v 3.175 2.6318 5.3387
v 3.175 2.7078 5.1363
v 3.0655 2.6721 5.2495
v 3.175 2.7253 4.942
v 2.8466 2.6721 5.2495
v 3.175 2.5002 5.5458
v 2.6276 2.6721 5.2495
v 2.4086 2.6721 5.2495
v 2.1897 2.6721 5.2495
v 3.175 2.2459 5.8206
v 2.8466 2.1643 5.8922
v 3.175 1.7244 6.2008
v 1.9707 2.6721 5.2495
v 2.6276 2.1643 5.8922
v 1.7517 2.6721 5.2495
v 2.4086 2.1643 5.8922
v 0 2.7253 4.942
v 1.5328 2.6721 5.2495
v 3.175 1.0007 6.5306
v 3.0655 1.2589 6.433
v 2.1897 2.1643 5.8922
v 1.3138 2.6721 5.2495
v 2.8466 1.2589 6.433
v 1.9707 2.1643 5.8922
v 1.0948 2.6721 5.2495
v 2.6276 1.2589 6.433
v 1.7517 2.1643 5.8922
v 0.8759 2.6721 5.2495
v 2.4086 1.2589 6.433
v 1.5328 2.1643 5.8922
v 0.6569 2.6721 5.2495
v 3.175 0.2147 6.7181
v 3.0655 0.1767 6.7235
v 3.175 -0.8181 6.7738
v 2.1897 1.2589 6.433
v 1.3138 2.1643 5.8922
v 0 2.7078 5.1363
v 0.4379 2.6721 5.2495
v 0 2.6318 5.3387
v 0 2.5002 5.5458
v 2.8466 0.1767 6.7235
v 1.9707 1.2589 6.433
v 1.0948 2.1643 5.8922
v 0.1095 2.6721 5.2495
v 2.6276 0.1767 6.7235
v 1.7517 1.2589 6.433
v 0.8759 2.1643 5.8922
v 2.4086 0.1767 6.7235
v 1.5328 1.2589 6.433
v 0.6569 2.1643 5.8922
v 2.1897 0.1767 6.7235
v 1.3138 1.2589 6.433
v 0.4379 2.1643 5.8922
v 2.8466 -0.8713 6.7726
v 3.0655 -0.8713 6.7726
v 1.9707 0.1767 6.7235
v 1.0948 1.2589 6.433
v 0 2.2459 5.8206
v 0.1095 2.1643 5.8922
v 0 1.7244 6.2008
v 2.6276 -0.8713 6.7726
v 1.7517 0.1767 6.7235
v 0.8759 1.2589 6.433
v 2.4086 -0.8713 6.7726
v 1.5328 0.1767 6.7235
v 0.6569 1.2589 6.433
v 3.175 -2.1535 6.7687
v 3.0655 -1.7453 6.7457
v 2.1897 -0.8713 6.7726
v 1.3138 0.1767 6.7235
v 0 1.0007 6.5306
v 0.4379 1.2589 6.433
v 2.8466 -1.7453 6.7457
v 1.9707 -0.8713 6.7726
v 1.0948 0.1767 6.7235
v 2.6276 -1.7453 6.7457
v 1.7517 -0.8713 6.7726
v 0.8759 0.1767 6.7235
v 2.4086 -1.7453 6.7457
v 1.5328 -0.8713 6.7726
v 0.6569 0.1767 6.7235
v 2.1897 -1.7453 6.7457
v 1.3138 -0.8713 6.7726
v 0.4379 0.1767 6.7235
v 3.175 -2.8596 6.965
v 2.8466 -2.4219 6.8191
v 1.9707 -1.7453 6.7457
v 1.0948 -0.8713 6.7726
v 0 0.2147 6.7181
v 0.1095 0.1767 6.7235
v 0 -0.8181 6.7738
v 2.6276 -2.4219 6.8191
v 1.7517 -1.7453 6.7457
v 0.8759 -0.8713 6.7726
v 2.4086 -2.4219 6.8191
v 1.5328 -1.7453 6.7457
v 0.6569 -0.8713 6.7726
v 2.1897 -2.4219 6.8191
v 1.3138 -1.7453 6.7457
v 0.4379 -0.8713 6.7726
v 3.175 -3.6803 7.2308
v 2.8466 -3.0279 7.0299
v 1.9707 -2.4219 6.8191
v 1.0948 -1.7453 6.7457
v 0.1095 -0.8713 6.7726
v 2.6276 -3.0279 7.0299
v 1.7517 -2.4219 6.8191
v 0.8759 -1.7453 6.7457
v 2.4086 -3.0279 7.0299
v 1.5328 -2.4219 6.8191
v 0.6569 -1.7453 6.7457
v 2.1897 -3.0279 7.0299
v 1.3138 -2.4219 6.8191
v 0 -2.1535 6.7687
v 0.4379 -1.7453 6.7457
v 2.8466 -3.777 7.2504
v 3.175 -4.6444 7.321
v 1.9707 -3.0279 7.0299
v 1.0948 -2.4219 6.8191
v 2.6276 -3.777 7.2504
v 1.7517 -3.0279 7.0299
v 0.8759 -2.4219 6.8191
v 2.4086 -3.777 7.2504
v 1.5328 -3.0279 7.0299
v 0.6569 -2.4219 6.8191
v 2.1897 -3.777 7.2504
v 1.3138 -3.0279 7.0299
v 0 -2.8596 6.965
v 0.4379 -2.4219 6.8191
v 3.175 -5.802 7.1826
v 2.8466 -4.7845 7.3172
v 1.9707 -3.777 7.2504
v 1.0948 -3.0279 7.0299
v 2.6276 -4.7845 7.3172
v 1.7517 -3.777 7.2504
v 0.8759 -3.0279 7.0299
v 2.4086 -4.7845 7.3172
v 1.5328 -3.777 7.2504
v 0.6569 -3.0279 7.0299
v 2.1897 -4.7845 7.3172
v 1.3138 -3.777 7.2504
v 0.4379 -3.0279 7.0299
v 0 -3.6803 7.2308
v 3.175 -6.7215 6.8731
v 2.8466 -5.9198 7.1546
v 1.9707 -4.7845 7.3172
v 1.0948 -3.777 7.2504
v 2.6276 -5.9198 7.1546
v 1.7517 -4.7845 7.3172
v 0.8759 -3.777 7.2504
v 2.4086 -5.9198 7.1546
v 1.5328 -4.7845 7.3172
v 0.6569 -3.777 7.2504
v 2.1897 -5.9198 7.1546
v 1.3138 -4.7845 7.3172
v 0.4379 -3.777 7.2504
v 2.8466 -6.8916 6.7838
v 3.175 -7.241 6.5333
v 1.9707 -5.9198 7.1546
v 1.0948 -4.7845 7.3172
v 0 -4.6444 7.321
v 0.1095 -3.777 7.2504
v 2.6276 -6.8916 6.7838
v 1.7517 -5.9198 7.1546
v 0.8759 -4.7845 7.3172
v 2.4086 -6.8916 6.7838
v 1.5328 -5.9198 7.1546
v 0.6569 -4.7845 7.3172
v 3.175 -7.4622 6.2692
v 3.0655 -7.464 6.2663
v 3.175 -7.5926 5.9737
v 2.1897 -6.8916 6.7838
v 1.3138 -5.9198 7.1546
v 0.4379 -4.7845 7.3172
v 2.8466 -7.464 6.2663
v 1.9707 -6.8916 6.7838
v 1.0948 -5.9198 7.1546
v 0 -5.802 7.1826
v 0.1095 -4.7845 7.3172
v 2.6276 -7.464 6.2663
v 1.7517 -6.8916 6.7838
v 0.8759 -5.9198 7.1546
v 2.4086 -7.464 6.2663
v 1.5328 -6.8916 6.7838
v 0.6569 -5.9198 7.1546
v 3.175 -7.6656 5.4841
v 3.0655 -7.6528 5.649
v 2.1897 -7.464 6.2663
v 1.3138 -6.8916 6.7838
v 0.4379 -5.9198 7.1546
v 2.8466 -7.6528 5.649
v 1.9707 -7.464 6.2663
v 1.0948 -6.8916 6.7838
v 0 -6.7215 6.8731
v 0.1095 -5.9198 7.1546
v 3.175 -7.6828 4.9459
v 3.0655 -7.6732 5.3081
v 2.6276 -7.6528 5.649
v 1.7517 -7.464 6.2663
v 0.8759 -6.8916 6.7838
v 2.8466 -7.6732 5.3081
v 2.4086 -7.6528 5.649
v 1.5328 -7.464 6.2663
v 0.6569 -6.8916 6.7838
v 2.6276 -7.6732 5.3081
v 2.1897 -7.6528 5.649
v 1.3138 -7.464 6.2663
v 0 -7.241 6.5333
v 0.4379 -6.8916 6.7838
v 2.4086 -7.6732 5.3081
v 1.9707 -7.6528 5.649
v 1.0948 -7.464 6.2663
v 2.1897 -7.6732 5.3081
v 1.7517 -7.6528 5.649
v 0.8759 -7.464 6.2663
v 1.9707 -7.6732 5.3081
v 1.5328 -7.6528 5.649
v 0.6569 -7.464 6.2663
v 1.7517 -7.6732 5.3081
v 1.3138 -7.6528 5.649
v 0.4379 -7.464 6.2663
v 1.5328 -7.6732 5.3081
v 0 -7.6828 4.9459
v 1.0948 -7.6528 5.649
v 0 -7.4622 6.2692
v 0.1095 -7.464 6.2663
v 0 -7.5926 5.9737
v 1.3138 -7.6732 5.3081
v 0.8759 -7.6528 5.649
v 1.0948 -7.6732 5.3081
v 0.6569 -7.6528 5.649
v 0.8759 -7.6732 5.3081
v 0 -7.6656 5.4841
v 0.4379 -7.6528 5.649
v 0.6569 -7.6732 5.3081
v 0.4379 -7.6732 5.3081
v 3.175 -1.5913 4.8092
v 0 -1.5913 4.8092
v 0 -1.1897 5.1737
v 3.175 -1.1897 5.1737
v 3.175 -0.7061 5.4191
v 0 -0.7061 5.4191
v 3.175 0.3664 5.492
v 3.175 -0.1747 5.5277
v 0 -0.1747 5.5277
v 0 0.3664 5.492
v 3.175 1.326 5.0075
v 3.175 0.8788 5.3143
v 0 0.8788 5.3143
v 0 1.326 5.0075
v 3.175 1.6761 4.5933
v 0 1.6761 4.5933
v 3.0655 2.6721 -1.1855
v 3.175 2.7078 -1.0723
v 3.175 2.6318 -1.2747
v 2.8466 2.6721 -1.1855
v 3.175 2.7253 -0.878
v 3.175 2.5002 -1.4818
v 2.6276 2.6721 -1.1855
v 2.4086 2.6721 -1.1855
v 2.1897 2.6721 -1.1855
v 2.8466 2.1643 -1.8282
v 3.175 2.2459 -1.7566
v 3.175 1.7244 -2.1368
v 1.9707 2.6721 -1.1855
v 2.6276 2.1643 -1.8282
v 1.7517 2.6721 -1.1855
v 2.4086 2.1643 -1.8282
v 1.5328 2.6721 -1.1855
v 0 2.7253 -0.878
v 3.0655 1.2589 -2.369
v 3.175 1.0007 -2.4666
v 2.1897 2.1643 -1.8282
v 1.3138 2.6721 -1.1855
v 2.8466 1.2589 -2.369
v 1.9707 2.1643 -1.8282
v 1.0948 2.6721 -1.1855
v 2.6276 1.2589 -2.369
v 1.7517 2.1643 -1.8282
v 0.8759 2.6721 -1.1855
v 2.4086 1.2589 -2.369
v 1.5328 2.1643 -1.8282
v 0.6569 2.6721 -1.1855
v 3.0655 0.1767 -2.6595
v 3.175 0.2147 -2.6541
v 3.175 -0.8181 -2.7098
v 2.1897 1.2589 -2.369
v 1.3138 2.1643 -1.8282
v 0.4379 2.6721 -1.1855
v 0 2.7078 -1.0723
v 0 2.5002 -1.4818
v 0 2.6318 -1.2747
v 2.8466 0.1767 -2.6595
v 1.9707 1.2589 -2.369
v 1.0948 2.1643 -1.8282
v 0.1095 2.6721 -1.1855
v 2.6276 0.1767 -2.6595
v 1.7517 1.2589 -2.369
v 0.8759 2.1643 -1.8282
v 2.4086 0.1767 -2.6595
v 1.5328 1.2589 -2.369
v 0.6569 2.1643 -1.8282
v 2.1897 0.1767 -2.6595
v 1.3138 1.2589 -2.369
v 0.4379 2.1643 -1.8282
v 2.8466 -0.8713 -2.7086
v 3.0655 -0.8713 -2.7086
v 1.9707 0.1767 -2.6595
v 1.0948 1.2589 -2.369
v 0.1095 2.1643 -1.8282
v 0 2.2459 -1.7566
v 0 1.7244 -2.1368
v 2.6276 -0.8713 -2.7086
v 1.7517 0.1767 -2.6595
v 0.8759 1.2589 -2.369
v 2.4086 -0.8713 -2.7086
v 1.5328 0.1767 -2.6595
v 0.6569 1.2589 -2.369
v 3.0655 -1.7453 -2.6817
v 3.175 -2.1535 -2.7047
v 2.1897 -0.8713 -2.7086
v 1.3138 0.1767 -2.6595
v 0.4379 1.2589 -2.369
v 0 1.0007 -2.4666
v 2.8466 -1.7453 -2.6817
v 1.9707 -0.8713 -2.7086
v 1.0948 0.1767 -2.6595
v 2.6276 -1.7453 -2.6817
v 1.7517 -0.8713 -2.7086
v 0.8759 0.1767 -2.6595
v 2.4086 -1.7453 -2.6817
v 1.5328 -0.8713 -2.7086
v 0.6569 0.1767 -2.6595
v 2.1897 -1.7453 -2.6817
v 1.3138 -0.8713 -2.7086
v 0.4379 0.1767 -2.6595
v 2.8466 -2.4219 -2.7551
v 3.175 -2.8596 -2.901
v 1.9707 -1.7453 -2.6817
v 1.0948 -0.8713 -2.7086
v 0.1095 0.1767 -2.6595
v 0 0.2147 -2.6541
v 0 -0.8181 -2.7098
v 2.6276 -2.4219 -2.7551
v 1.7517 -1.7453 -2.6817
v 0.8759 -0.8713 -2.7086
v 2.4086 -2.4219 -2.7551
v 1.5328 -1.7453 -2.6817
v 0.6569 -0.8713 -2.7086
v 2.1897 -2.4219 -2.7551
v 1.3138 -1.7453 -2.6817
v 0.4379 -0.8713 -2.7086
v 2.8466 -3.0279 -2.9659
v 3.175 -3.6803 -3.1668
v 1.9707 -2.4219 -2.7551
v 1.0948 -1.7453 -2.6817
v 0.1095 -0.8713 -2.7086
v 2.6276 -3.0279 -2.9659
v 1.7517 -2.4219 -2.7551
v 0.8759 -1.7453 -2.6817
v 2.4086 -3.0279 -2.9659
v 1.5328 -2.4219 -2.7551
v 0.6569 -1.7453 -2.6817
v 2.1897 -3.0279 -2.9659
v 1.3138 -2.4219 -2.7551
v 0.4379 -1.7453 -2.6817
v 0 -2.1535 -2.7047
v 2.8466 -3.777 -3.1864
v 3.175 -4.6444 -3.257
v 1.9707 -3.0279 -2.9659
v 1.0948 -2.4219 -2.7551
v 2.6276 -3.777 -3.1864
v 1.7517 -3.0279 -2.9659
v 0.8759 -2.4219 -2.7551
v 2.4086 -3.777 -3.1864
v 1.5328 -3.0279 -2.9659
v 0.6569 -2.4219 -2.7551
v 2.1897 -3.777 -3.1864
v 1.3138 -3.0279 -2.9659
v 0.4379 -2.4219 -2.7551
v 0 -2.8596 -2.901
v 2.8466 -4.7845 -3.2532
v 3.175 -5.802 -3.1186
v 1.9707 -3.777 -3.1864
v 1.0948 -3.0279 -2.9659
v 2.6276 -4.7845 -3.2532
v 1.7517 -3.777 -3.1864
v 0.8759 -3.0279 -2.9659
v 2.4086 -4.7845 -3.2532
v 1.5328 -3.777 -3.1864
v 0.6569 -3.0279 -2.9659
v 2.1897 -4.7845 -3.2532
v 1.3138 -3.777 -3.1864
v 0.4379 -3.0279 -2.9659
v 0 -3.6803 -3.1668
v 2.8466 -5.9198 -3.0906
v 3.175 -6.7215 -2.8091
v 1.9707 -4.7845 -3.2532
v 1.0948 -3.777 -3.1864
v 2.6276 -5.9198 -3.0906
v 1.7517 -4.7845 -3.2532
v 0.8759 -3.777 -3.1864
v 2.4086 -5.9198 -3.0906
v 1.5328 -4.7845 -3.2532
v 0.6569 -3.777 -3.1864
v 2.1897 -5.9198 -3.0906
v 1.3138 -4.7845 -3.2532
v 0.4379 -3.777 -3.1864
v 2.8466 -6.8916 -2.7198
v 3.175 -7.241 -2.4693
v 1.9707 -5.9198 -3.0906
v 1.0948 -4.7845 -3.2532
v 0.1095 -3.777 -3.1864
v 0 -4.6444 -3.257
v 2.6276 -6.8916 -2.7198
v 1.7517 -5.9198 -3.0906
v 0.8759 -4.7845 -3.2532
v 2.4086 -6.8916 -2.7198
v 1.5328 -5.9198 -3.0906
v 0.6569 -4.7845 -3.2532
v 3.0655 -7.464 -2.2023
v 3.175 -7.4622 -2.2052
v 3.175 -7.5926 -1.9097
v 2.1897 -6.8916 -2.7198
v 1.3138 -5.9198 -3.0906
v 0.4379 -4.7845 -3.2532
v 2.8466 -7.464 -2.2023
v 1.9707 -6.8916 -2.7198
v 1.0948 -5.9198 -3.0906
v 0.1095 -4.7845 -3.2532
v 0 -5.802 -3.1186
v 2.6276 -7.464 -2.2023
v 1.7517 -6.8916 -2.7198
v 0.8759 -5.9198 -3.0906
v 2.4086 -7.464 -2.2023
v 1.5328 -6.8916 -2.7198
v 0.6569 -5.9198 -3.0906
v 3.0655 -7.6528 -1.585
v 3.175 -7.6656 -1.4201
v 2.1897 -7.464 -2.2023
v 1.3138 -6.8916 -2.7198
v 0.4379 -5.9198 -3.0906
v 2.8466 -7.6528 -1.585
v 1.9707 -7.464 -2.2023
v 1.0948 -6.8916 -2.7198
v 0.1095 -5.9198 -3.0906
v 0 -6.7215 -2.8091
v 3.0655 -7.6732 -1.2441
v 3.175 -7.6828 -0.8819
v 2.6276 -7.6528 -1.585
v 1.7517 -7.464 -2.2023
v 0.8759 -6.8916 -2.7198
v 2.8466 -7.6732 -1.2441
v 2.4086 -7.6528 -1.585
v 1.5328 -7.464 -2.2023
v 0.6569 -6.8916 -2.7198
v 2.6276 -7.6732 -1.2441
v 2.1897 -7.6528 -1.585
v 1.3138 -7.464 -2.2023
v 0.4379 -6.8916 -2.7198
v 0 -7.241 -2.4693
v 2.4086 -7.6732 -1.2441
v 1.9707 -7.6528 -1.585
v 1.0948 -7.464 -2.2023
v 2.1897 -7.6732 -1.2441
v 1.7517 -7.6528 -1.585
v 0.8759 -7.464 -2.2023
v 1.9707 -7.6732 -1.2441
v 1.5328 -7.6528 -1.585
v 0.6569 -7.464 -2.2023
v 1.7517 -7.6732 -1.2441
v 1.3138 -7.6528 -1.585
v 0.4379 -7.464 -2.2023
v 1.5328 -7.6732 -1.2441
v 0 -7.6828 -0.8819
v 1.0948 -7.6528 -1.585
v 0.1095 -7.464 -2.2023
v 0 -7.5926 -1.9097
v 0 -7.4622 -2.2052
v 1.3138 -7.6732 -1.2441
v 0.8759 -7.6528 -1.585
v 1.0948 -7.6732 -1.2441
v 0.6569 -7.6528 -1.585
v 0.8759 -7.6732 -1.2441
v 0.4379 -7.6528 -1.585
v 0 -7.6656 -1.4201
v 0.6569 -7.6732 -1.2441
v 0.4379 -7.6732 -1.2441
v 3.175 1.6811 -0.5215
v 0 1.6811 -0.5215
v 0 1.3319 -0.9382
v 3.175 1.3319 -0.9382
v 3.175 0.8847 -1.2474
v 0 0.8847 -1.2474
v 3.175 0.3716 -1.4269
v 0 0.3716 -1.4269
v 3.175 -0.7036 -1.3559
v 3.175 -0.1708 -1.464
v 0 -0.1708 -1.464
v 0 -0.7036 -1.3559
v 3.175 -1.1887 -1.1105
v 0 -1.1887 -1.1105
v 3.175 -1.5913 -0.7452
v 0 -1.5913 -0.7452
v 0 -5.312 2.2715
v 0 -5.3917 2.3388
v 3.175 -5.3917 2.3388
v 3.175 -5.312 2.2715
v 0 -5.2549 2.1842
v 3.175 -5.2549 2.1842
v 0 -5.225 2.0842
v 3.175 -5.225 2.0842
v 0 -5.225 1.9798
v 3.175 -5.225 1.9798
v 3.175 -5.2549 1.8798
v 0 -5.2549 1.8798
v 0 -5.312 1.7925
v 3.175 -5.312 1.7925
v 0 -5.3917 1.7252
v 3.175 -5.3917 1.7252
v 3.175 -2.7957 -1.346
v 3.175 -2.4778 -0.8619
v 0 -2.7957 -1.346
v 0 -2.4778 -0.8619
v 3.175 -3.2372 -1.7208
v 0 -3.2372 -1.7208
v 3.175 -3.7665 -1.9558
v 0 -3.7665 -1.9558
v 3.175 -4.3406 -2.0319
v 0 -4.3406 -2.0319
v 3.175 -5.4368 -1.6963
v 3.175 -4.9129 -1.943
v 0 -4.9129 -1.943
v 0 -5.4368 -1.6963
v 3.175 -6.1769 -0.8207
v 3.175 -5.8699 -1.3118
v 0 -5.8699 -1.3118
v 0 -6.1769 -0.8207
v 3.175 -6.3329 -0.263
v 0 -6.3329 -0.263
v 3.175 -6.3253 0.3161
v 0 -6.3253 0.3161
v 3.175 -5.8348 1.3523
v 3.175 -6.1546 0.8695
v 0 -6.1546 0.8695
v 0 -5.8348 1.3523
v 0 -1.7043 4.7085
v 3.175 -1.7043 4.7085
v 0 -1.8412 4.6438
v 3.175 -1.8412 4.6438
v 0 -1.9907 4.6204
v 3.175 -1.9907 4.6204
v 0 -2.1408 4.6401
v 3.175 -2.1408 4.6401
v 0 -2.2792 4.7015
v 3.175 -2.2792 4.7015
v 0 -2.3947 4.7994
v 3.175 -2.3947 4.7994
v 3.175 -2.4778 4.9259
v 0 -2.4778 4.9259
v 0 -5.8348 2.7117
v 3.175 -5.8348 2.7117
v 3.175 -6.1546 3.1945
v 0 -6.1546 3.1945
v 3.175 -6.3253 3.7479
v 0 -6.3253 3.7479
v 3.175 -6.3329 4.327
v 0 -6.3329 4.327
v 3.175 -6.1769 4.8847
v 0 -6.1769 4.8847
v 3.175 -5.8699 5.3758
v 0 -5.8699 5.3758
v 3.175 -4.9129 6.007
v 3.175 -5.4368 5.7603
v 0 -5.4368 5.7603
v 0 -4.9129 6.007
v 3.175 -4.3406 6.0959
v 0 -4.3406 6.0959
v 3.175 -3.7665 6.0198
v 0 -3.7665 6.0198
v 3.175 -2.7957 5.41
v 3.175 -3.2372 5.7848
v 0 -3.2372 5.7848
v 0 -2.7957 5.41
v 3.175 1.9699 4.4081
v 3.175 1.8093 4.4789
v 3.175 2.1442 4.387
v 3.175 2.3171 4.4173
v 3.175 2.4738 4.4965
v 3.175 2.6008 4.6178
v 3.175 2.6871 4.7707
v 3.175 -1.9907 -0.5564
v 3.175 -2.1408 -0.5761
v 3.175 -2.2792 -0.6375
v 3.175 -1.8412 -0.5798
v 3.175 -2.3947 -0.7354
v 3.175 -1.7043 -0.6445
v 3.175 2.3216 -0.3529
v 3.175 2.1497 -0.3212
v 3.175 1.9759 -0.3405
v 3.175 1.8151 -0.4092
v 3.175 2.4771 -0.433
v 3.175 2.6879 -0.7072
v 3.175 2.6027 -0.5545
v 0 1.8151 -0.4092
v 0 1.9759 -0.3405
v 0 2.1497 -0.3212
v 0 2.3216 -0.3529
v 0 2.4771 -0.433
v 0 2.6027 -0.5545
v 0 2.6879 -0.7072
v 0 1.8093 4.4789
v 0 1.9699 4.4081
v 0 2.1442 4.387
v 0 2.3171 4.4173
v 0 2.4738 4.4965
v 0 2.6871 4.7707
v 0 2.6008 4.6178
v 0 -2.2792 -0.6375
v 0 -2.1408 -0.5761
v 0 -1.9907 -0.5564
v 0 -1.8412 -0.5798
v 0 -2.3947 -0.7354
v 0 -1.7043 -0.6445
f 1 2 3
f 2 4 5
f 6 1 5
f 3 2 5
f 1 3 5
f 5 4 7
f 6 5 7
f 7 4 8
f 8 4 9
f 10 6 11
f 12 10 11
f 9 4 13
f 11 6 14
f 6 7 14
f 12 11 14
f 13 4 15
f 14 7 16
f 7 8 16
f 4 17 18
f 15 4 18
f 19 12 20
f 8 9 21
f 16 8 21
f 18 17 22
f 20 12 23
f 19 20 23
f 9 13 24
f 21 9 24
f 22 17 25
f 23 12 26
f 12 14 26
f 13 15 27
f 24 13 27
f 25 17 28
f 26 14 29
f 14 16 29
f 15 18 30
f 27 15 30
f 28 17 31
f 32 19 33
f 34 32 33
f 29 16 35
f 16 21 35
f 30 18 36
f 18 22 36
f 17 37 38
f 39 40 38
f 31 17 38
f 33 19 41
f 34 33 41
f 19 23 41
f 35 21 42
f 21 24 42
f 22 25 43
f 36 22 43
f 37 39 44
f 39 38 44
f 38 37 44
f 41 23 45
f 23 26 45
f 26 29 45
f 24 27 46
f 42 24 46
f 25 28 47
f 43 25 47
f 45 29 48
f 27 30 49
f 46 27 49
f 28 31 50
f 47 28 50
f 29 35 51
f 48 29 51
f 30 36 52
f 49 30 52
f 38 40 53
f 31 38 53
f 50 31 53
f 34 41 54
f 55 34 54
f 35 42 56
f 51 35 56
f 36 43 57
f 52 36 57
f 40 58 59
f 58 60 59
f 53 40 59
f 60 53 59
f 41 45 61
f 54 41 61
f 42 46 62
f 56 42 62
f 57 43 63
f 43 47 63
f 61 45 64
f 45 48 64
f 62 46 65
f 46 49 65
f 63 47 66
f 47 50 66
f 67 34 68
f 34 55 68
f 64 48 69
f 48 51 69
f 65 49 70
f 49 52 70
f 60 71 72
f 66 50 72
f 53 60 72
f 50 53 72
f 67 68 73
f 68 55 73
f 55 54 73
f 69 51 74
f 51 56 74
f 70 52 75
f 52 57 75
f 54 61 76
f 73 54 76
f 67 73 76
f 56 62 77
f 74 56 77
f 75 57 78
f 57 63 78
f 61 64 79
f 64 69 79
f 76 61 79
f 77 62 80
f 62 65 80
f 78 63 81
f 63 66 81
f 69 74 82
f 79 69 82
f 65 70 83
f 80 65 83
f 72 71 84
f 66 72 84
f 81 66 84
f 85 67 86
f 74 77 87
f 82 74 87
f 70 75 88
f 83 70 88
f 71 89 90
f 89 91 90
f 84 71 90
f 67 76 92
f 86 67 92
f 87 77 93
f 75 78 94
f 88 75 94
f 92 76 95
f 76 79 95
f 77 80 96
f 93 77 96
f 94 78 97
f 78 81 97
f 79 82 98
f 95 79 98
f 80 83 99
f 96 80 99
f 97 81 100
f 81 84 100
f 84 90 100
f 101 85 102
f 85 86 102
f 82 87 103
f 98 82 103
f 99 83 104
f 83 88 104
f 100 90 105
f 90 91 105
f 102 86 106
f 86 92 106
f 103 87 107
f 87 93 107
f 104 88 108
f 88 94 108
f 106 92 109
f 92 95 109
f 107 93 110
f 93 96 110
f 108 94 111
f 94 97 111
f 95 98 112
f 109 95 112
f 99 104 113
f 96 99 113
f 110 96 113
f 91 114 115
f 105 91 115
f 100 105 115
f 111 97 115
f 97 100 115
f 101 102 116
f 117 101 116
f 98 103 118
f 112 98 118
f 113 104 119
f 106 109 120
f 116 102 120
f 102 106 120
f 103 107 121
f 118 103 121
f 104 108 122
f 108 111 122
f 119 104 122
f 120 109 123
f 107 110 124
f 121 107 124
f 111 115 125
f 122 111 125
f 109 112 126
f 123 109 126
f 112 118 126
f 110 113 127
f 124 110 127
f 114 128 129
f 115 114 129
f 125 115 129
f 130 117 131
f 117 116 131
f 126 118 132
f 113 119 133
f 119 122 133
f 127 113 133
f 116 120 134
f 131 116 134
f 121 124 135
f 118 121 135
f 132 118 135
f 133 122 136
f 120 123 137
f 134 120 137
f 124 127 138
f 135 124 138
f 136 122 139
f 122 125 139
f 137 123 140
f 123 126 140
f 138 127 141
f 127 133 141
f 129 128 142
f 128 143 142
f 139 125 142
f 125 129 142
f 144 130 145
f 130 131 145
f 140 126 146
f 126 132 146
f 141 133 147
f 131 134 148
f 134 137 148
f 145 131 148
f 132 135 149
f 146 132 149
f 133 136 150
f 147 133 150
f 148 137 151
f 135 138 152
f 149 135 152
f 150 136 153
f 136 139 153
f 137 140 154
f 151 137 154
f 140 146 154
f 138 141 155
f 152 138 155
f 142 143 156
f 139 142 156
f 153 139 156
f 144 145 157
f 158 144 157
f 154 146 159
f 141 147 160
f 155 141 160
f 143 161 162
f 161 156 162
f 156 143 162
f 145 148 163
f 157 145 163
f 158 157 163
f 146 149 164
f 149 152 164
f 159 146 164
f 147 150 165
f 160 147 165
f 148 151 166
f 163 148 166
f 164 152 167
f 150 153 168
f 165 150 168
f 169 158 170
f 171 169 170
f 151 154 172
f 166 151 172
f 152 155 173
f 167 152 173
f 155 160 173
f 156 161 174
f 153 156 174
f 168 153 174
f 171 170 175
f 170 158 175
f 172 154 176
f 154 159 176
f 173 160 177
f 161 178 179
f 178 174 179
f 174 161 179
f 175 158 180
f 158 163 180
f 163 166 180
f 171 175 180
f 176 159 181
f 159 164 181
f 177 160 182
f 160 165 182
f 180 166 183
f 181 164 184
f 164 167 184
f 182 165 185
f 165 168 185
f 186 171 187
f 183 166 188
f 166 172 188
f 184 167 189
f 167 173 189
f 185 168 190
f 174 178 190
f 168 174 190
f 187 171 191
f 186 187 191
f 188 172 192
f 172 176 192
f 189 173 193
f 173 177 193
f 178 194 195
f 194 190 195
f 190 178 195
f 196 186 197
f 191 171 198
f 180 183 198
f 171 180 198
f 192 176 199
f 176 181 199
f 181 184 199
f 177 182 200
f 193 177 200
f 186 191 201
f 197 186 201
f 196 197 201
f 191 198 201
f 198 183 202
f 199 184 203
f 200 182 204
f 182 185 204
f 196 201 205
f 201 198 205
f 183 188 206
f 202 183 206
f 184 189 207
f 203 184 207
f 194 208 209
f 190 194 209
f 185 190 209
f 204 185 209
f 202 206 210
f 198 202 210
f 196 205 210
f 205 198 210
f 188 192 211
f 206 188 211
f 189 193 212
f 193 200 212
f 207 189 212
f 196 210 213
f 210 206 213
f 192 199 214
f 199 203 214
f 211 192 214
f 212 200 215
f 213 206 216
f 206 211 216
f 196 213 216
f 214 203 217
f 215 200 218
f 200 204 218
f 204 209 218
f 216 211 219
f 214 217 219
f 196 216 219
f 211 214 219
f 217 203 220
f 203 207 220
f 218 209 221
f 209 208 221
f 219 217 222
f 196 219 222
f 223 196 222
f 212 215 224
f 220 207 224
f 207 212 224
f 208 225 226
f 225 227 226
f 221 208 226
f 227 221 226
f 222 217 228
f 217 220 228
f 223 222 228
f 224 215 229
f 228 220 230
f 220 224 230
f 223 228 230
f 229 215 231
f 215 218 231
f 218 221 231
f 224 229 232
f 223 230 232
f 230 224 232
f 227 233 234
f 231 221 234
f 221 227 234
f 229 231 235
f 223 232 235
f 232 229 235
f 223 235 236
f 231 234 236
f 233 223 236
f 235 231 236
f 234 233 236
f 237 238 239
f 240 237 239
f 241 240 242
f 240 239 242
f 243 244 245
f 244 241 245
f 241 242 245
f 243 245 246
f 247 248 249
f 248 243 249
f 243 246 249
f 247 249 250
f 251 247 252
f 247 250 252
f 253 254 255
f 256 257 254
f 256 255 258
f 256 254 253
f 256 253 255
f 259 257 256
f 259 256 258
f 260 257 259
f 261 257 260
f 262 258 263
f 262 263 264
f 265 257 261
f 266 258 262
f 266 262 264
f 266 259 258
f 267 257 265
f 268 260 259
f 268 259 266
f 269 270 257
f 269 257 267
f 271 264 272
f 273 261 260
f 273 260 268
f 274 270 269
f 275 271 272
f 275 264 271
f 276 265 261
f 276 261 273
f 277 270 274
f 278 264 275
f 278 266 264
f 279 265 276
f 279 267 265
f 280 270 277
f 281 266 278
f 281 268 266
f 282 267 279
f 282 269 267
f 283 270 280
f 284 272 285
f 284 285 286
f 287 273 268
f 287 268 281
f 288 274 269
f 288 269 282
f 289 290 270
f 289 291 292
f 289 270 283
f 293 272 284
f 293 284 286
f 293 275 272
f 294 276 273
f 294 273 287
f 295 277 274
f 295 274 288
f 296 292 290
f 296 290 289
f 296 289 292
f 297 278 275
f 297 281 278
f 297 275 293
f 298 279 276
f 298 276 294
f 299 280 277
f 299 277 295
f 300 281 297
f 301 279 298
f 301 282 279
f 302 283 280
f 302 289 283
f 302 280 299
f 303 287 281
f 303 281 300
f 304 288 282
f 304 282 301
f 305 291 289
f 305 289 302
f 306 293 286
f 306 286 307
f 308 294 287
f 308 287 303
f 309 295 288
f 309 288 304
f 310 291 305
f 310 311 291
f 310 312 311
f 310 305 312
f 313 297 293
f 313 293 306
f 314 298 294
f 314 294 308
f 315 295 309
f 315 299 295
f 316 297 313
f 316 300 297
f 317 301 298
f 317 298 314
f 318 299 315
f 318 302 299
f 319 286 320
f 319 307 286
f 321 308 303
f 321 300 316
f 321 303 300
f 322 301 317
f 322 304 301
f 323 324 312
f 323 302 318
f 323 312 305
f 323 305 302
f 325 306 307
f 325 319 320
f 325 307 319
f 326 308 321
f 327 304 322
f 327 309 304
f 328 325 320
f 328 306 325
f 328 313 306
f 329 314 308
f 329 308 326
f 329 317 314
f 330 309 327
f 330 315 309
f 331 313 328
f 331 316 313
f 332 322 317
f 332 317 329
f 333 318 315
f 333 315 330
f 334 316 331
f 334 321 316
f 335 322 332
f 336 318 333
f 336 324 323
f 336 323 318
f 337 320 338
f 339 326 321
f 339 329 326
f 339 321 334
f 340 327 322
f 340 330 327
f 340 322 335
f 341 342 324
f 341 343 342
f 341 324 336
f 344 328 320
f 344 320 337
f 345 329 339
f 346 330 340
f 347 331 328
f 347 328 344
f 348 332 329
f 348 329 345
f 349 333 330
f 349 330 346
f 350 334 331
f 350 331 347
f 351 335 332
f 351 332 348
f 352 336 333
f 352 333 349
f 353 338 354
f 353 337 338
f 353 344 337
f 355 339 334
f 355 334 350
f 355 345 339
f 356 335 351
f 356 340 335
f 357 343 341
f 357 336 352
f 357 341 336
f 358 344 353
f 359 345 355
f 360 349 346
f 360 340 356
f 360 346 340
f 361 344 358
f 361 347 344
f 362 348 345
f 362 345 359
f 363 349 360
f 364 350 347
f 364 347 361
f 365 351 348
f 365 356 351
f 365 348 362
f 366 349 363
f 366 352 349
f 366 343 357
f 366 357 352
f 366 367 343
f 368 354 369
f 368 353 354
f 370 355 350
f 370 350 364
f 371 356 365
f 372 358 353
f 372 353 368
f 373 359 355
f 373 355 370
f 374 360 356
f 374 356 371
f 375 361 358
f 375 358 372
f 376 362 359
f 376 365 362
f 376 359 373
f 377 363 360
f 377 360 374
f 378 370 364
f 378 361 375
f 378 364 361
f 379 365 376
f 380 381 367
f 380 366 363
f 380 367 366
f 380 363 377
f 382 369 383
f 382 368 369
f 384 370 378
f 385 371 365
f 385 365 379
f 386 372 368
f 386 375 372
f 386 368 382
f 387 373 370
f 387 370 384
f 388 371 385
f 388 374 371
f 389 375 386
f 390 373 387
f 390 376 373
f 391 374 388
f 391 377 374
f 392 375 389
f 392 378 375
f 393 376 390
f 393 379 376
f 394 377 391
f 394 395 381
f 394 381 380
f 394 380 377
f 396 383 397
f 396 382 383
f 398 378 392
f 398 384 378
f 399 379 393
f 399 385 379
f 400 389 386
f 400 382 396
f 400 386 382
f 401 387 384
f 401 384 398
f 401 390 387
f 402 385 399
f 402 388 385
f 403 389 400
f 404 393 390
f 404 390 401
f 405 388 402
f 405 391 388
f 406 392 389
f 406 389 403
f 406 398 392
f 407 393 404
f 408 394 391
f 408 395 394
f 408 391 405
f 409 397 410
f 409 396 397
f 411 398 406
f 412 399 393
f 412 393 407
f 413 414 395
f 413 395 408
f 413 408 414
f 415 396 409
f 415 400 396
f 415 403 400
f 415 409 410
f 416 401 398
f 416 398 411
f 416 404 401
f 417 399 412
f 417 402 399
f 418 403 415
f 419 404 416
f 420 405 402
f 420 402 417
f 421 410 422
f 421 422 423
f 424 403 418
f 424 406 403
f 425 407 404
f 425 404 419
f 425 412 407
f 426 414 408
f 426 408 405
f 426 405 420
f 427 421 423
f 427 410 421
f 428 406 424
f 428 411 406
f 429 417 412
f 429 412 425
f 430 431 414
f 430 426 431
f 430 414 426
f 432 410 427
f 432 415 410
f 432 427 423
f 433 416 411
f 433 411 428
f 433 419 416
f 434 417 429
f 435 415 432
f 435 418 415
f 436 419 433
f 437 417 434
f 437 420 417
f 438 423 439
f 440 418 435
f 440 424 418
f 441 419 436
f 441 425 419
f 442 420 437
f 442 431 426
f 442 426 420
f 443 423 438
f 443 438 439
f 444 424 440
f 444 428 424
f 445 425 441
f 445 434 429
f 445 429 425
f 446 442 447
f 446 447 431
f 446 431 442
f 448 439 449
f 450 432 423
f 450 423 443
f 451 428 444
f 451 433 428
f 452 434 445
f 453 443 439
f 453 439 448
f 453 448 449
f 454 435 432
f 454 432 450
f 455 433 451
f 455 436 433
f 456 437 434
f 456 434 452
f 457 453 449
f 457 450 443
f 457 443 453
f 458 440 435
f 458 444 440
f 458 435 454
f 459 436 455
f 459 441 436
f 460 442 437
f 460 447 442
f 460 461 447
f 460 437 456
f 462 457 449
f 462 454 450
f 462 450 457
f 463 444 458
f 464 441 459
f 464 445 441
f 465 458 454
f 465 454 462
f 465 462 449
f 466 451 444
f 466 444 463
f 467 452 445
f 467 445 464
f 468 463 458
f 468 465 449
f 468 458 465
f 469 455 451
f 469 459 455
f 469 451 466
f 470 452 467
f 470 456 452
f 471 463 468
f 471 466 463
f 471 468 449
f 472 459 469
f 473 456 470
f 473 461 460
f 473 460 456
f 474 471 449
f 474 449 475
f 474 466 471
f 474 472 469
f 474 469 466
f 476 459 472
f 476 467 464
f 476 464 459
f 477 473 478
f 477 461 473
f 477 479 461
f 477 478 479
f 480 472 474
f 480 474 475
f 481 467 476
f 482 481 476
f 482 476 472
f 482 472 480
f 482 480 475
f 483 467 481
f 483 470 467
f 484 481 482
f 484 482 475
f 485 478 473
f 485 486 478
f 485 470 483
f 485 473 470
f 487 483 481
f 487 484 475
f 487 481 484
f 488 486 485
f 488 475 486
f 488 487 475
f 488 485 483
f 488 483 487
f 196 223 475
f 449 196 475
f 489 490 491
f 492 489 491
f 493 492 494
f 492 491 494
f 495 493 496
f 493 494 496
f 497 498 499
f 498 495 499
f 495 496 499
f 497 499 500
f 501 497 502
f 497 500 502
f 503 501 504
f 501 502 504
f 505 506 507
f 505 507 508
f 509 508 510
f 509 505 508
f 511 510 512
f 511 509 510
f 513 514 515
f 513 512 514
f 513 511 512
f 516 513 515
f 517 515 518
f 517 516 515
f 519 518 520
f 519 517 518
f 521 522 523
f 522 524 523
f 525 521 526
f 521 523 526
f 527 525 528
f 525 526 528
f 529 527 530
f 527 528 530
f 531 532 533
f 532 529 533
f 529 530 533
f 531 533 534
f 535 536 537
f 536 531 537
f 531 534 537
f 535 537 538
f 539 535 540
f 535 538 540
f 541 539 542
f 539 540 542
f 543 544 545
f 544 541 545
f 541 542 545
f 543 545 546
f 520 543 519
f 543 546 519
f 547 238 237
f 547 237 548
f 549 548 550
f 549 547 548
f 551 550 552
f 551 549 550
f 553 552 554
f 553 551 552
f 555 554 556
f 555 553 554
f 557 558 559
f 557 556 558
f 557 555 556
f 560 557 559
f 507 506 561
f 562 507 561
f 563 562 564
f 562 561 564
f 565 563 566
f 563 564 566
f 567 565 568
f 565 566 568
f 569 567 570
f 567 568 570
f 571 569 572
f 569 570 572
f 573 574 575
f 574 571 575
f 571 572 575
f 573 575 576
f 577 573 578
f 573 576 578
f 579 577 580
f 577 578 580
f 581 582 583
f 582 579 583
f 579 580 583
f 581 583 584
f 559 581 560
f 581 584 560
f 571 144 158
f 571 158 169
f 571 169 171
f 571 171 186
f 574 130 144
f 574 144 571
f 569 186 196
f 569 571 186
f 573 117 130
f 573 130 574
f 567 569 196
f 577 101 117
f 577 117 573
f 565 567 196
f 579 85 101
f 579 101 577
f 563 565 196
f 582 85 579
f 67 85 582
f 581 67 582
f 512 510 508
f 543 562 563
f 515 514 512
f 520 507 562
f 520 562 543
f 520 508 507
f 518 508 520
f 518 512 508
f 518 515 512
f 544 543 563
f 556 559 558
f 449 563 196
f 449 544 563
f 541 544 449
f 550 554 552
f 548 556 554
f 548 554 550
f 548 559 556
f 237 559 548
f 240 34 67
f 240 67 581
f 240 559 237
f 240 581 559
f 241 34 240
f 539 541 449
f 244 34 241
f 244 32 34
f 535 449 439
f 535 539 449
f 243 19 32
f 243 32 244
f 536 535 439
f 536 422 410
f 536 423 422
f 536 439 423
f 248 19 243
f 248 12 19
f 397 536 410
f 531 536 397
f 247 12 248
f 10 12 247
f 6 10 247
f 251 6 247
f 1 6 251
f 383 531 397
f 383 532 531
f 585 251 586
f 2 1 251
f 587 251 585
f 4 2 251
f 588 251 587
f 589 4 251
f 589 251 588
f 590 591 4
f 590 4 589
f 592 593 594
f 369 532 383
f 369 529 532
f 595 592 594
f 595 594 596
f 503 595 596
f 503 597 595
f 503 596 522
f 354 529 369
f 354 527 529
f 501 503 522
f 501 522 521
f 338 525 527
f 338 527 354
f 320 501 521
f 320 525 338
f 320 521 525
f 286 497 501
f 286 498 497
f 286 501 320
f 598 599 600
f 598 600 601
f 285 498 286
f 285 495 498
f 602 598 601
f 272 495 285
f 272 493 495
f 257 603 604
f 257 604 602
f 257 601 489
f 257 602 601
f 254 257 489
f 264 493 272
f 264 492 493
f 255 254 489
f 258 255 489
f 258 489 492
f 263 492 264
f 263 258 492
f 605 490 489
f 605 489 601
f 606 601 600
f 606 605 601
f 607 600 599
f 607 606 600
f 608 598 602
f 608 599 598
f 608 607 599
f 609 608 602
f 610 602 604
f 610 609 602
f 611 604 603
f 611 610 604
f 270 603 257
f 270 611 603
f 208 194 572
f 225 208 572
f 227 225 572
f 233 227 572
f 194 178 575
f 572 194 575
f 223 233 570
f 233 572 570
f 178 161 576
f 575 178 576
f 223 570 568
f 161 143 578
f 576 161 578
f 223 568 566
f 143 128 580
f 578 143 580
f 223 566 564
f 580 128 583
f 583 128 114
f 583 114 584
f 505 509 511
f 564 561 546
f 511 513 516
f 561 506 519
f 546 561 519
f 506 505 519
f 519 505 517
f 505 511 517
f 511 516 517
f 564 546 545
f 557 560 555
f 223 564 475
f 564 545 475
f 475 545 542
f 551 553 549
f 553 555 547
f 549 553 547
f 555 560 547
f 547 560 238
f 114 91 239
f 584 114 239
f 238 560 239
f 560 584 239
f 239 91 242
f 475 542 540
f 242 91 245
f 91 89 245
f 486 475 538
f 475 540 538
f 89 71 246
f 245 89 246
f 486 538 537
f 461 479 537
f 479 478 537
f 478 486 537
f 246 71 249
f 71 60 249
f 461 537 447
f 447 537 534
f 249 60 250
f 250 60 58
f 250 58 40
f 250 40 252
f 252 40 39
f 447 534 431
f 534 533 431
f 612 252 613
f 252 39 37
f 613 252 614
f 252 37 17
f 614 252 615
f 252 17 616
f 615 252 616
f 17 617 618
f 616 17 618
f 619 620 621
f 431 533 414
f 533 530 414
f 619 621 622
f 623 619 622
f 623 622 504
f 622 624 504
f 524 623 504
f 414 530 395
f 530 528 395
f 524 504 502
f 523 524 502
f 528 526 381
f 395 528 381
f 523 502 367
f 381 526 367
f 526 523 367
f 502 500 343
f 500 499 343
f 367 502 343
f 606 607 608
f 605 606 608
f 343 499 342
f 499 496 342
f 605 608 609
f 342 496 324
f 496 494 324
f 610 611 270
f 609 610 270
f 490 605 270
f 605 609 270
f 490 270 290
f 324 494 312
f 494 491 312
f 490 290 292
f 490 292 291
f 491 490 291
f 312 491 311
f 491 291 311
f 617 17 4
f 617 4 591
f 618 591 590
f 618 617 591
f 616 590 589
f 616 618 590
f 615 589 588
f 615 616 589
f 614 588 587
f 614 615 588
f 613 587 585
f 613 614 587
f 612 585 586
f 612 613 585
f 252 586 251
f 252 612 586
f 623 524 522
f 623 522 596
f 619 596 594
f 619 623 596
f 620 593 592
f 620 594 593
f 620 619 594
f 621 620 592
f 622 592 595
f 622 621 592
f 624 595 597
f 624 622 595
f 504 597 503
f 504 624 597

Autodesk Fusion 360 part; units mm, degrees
sketch "Sketch1" plane through (0, 0, 0) normal (1, 0, 0) x (0, 0, -1)
  arc A0 (-1.7252, -5.3917) -> (-2.3388, -5.3917) centre (-2.032, -5.5826) ccw
  arc A1 (-4.9259, -2.4778) -> (-4.8092, -1.5913) centre (-5.151, -1.9973) ccw
  arc A2 (-4.5933, 1.6761) -> (-4.8092, -1.5913) centre (-3.5004, -0.0369) ccw
  arc A3 (-4.5933, 1.6761) -> (-4.942, 2.7253) centre (-4.9853, 2.1284) ccw
  spline S0 degree 5 poles (-4.942, 2.7253) (-5.0108, 2.7298) (-5.1515, 2.719) (-5.3719, 2.6441) (-5.6787, 2.4311) (-6.0509, 2.0053) (-6.3722, 1.46) (-6.6087, 0.8412) (-6.7429, 0.1952) (-6.7866, -0.437) (-6.7727, -1.023) (-6.7432, -1.5409) (-6.7385, -1.983) (-6.7876, -2.3576) (-6.895, -2.6945) (-7.0391, -3.0399) (-7.1857, -3.4411) (-7.2967, -3.9334) (-7.3414, -4.5262) (-7.3057, -5.1888) (-7.189, -5.8659) (-6.9992, -6.4921) (-6.7492, -7.0069) (-6.4531, -7.3688) (-6.1219, -7.5724) (-5.7607, -7.6559) (-5.4492, -7.671) (-5.2026, -7.6764) (-5.0324, -7.6806) (-4.9459, -7.6828) knots 0 0 0 0 0 0 0.04 0.08 0.12 0.16 0.2 0.24 0.28 0.32 0.36 0.4 0.44 0.48 0.52 0.56 0.6 0.64 0.68 0.72 0.76 0.8 0.84 0.88 0.92 0.96 1 1 1 1 1 1
  line L0 (-4.3156, 2.6849) -> (-5.5683, 2.7657)
  line L1 (-6.1689, -7.651) -> (-3.7229, -7.7146)
  arc A4 (0.7452, -1.5913) -> (0.5215, 1.6811) centre (-0.5636, -0.0369) ccw
  arc A5 (0.7452, -1.5913) -> (0.8619, -2.4778) centre (1.087, -1.9973) ccw
  arc A6 (0.878, 2.7253) -> (0.5215, 1.6811) centre (0.9193, 2.1283) ccw
  arc A7 (-4.9259, -2.4778) -> (-2.3388, -5.3917) centre (-4.064, -4.318) ccw
  arc A8 (-1.7252, -5.3917) -> (0.8619, -2.4778) centre (0, -4.318) ccw
  spline S1 degree 5 poles (0.878, 2.7253) (0.9468, 2.7298) (1.0875, 2.719) (1.3079, 2.6441) (1.6147, 2.4311) (1.9869, 2.0053) (2.3082, 1.46) (2.5447, 0.8412) (2.6789, 0.1952) (2.7226, -0.437) (2.7087, -1.023) (2.6792, -1.5409) (2.6745, -1.983) (2.7236, -2.3576) (2.831, -2.6945) (2.9751, -3.0399) (3.1217, -3.4411) (3.2327, -3.9334) (3.2774, -4.5262) (3.2417, -5.1888) (3.125, -5.8659) (2.9352, -6.4921) (2.6852, -7.0069) (2.3891, -7.3688) (2.0579, -7.5724) (1.6967, -7.6559) (1.3852, -7.671) (1.1386, -7.6764) (0.9684, -7.6806) (0.8819, -7.6828) knots 0 0 0 0 0 0 0.04 0.08 0.12 0.16 0.2 0.24 0.28 0.32 0.36 0.4 0.44 0.48 0.52 0.56 0.6 0.64 0.68 0.72 0.76 0.8 0.84 0.88 0.92 0.96 1 1 1 1 1 1
  line L2 (0.2516, 2.6849) -> (1.5043, 2.7657)
  line L3 (2.1049, -7.651) -> (-0.3411, -7.7146)
  line L4 (-4.9459, -7.6828) -> (0.8819, -7.6828)
  point P0 (-6.604, 0.762)
  point P1 (-6.7719, -2.1775)
  point P2 (-7.2799, -3.9555)
  point P3 (-6.5179, -7.2575)
  point P4 (4.064, 0)
  point P5 (2.032, -5.5826)
  point P6 (4.064, 0)
  point P7 (2.032, -5.5826)
  point P8 (2.032, -5.2212)
  point P9 (1.7252, -5.3917)
  point P10 (2.54, 0.762)
  point P11 (2.7079, -2.1775)
  point P12 (3.2159, -3.9555)
  point P13 (2.4539, -7.2575)
extrude "Extrude1" add sketch "Sketch1" along normal blind 3.175 in component "Component"
extrude "Extrude2" [suppressed]
extrude "Extrude1'" [suppressed]
fillet "Fillet1" [suppressed]
component "Component" placed x (1, 0, 0) y (0, 1, 0) z (0, 0, 1) at (0, 0, 0)
